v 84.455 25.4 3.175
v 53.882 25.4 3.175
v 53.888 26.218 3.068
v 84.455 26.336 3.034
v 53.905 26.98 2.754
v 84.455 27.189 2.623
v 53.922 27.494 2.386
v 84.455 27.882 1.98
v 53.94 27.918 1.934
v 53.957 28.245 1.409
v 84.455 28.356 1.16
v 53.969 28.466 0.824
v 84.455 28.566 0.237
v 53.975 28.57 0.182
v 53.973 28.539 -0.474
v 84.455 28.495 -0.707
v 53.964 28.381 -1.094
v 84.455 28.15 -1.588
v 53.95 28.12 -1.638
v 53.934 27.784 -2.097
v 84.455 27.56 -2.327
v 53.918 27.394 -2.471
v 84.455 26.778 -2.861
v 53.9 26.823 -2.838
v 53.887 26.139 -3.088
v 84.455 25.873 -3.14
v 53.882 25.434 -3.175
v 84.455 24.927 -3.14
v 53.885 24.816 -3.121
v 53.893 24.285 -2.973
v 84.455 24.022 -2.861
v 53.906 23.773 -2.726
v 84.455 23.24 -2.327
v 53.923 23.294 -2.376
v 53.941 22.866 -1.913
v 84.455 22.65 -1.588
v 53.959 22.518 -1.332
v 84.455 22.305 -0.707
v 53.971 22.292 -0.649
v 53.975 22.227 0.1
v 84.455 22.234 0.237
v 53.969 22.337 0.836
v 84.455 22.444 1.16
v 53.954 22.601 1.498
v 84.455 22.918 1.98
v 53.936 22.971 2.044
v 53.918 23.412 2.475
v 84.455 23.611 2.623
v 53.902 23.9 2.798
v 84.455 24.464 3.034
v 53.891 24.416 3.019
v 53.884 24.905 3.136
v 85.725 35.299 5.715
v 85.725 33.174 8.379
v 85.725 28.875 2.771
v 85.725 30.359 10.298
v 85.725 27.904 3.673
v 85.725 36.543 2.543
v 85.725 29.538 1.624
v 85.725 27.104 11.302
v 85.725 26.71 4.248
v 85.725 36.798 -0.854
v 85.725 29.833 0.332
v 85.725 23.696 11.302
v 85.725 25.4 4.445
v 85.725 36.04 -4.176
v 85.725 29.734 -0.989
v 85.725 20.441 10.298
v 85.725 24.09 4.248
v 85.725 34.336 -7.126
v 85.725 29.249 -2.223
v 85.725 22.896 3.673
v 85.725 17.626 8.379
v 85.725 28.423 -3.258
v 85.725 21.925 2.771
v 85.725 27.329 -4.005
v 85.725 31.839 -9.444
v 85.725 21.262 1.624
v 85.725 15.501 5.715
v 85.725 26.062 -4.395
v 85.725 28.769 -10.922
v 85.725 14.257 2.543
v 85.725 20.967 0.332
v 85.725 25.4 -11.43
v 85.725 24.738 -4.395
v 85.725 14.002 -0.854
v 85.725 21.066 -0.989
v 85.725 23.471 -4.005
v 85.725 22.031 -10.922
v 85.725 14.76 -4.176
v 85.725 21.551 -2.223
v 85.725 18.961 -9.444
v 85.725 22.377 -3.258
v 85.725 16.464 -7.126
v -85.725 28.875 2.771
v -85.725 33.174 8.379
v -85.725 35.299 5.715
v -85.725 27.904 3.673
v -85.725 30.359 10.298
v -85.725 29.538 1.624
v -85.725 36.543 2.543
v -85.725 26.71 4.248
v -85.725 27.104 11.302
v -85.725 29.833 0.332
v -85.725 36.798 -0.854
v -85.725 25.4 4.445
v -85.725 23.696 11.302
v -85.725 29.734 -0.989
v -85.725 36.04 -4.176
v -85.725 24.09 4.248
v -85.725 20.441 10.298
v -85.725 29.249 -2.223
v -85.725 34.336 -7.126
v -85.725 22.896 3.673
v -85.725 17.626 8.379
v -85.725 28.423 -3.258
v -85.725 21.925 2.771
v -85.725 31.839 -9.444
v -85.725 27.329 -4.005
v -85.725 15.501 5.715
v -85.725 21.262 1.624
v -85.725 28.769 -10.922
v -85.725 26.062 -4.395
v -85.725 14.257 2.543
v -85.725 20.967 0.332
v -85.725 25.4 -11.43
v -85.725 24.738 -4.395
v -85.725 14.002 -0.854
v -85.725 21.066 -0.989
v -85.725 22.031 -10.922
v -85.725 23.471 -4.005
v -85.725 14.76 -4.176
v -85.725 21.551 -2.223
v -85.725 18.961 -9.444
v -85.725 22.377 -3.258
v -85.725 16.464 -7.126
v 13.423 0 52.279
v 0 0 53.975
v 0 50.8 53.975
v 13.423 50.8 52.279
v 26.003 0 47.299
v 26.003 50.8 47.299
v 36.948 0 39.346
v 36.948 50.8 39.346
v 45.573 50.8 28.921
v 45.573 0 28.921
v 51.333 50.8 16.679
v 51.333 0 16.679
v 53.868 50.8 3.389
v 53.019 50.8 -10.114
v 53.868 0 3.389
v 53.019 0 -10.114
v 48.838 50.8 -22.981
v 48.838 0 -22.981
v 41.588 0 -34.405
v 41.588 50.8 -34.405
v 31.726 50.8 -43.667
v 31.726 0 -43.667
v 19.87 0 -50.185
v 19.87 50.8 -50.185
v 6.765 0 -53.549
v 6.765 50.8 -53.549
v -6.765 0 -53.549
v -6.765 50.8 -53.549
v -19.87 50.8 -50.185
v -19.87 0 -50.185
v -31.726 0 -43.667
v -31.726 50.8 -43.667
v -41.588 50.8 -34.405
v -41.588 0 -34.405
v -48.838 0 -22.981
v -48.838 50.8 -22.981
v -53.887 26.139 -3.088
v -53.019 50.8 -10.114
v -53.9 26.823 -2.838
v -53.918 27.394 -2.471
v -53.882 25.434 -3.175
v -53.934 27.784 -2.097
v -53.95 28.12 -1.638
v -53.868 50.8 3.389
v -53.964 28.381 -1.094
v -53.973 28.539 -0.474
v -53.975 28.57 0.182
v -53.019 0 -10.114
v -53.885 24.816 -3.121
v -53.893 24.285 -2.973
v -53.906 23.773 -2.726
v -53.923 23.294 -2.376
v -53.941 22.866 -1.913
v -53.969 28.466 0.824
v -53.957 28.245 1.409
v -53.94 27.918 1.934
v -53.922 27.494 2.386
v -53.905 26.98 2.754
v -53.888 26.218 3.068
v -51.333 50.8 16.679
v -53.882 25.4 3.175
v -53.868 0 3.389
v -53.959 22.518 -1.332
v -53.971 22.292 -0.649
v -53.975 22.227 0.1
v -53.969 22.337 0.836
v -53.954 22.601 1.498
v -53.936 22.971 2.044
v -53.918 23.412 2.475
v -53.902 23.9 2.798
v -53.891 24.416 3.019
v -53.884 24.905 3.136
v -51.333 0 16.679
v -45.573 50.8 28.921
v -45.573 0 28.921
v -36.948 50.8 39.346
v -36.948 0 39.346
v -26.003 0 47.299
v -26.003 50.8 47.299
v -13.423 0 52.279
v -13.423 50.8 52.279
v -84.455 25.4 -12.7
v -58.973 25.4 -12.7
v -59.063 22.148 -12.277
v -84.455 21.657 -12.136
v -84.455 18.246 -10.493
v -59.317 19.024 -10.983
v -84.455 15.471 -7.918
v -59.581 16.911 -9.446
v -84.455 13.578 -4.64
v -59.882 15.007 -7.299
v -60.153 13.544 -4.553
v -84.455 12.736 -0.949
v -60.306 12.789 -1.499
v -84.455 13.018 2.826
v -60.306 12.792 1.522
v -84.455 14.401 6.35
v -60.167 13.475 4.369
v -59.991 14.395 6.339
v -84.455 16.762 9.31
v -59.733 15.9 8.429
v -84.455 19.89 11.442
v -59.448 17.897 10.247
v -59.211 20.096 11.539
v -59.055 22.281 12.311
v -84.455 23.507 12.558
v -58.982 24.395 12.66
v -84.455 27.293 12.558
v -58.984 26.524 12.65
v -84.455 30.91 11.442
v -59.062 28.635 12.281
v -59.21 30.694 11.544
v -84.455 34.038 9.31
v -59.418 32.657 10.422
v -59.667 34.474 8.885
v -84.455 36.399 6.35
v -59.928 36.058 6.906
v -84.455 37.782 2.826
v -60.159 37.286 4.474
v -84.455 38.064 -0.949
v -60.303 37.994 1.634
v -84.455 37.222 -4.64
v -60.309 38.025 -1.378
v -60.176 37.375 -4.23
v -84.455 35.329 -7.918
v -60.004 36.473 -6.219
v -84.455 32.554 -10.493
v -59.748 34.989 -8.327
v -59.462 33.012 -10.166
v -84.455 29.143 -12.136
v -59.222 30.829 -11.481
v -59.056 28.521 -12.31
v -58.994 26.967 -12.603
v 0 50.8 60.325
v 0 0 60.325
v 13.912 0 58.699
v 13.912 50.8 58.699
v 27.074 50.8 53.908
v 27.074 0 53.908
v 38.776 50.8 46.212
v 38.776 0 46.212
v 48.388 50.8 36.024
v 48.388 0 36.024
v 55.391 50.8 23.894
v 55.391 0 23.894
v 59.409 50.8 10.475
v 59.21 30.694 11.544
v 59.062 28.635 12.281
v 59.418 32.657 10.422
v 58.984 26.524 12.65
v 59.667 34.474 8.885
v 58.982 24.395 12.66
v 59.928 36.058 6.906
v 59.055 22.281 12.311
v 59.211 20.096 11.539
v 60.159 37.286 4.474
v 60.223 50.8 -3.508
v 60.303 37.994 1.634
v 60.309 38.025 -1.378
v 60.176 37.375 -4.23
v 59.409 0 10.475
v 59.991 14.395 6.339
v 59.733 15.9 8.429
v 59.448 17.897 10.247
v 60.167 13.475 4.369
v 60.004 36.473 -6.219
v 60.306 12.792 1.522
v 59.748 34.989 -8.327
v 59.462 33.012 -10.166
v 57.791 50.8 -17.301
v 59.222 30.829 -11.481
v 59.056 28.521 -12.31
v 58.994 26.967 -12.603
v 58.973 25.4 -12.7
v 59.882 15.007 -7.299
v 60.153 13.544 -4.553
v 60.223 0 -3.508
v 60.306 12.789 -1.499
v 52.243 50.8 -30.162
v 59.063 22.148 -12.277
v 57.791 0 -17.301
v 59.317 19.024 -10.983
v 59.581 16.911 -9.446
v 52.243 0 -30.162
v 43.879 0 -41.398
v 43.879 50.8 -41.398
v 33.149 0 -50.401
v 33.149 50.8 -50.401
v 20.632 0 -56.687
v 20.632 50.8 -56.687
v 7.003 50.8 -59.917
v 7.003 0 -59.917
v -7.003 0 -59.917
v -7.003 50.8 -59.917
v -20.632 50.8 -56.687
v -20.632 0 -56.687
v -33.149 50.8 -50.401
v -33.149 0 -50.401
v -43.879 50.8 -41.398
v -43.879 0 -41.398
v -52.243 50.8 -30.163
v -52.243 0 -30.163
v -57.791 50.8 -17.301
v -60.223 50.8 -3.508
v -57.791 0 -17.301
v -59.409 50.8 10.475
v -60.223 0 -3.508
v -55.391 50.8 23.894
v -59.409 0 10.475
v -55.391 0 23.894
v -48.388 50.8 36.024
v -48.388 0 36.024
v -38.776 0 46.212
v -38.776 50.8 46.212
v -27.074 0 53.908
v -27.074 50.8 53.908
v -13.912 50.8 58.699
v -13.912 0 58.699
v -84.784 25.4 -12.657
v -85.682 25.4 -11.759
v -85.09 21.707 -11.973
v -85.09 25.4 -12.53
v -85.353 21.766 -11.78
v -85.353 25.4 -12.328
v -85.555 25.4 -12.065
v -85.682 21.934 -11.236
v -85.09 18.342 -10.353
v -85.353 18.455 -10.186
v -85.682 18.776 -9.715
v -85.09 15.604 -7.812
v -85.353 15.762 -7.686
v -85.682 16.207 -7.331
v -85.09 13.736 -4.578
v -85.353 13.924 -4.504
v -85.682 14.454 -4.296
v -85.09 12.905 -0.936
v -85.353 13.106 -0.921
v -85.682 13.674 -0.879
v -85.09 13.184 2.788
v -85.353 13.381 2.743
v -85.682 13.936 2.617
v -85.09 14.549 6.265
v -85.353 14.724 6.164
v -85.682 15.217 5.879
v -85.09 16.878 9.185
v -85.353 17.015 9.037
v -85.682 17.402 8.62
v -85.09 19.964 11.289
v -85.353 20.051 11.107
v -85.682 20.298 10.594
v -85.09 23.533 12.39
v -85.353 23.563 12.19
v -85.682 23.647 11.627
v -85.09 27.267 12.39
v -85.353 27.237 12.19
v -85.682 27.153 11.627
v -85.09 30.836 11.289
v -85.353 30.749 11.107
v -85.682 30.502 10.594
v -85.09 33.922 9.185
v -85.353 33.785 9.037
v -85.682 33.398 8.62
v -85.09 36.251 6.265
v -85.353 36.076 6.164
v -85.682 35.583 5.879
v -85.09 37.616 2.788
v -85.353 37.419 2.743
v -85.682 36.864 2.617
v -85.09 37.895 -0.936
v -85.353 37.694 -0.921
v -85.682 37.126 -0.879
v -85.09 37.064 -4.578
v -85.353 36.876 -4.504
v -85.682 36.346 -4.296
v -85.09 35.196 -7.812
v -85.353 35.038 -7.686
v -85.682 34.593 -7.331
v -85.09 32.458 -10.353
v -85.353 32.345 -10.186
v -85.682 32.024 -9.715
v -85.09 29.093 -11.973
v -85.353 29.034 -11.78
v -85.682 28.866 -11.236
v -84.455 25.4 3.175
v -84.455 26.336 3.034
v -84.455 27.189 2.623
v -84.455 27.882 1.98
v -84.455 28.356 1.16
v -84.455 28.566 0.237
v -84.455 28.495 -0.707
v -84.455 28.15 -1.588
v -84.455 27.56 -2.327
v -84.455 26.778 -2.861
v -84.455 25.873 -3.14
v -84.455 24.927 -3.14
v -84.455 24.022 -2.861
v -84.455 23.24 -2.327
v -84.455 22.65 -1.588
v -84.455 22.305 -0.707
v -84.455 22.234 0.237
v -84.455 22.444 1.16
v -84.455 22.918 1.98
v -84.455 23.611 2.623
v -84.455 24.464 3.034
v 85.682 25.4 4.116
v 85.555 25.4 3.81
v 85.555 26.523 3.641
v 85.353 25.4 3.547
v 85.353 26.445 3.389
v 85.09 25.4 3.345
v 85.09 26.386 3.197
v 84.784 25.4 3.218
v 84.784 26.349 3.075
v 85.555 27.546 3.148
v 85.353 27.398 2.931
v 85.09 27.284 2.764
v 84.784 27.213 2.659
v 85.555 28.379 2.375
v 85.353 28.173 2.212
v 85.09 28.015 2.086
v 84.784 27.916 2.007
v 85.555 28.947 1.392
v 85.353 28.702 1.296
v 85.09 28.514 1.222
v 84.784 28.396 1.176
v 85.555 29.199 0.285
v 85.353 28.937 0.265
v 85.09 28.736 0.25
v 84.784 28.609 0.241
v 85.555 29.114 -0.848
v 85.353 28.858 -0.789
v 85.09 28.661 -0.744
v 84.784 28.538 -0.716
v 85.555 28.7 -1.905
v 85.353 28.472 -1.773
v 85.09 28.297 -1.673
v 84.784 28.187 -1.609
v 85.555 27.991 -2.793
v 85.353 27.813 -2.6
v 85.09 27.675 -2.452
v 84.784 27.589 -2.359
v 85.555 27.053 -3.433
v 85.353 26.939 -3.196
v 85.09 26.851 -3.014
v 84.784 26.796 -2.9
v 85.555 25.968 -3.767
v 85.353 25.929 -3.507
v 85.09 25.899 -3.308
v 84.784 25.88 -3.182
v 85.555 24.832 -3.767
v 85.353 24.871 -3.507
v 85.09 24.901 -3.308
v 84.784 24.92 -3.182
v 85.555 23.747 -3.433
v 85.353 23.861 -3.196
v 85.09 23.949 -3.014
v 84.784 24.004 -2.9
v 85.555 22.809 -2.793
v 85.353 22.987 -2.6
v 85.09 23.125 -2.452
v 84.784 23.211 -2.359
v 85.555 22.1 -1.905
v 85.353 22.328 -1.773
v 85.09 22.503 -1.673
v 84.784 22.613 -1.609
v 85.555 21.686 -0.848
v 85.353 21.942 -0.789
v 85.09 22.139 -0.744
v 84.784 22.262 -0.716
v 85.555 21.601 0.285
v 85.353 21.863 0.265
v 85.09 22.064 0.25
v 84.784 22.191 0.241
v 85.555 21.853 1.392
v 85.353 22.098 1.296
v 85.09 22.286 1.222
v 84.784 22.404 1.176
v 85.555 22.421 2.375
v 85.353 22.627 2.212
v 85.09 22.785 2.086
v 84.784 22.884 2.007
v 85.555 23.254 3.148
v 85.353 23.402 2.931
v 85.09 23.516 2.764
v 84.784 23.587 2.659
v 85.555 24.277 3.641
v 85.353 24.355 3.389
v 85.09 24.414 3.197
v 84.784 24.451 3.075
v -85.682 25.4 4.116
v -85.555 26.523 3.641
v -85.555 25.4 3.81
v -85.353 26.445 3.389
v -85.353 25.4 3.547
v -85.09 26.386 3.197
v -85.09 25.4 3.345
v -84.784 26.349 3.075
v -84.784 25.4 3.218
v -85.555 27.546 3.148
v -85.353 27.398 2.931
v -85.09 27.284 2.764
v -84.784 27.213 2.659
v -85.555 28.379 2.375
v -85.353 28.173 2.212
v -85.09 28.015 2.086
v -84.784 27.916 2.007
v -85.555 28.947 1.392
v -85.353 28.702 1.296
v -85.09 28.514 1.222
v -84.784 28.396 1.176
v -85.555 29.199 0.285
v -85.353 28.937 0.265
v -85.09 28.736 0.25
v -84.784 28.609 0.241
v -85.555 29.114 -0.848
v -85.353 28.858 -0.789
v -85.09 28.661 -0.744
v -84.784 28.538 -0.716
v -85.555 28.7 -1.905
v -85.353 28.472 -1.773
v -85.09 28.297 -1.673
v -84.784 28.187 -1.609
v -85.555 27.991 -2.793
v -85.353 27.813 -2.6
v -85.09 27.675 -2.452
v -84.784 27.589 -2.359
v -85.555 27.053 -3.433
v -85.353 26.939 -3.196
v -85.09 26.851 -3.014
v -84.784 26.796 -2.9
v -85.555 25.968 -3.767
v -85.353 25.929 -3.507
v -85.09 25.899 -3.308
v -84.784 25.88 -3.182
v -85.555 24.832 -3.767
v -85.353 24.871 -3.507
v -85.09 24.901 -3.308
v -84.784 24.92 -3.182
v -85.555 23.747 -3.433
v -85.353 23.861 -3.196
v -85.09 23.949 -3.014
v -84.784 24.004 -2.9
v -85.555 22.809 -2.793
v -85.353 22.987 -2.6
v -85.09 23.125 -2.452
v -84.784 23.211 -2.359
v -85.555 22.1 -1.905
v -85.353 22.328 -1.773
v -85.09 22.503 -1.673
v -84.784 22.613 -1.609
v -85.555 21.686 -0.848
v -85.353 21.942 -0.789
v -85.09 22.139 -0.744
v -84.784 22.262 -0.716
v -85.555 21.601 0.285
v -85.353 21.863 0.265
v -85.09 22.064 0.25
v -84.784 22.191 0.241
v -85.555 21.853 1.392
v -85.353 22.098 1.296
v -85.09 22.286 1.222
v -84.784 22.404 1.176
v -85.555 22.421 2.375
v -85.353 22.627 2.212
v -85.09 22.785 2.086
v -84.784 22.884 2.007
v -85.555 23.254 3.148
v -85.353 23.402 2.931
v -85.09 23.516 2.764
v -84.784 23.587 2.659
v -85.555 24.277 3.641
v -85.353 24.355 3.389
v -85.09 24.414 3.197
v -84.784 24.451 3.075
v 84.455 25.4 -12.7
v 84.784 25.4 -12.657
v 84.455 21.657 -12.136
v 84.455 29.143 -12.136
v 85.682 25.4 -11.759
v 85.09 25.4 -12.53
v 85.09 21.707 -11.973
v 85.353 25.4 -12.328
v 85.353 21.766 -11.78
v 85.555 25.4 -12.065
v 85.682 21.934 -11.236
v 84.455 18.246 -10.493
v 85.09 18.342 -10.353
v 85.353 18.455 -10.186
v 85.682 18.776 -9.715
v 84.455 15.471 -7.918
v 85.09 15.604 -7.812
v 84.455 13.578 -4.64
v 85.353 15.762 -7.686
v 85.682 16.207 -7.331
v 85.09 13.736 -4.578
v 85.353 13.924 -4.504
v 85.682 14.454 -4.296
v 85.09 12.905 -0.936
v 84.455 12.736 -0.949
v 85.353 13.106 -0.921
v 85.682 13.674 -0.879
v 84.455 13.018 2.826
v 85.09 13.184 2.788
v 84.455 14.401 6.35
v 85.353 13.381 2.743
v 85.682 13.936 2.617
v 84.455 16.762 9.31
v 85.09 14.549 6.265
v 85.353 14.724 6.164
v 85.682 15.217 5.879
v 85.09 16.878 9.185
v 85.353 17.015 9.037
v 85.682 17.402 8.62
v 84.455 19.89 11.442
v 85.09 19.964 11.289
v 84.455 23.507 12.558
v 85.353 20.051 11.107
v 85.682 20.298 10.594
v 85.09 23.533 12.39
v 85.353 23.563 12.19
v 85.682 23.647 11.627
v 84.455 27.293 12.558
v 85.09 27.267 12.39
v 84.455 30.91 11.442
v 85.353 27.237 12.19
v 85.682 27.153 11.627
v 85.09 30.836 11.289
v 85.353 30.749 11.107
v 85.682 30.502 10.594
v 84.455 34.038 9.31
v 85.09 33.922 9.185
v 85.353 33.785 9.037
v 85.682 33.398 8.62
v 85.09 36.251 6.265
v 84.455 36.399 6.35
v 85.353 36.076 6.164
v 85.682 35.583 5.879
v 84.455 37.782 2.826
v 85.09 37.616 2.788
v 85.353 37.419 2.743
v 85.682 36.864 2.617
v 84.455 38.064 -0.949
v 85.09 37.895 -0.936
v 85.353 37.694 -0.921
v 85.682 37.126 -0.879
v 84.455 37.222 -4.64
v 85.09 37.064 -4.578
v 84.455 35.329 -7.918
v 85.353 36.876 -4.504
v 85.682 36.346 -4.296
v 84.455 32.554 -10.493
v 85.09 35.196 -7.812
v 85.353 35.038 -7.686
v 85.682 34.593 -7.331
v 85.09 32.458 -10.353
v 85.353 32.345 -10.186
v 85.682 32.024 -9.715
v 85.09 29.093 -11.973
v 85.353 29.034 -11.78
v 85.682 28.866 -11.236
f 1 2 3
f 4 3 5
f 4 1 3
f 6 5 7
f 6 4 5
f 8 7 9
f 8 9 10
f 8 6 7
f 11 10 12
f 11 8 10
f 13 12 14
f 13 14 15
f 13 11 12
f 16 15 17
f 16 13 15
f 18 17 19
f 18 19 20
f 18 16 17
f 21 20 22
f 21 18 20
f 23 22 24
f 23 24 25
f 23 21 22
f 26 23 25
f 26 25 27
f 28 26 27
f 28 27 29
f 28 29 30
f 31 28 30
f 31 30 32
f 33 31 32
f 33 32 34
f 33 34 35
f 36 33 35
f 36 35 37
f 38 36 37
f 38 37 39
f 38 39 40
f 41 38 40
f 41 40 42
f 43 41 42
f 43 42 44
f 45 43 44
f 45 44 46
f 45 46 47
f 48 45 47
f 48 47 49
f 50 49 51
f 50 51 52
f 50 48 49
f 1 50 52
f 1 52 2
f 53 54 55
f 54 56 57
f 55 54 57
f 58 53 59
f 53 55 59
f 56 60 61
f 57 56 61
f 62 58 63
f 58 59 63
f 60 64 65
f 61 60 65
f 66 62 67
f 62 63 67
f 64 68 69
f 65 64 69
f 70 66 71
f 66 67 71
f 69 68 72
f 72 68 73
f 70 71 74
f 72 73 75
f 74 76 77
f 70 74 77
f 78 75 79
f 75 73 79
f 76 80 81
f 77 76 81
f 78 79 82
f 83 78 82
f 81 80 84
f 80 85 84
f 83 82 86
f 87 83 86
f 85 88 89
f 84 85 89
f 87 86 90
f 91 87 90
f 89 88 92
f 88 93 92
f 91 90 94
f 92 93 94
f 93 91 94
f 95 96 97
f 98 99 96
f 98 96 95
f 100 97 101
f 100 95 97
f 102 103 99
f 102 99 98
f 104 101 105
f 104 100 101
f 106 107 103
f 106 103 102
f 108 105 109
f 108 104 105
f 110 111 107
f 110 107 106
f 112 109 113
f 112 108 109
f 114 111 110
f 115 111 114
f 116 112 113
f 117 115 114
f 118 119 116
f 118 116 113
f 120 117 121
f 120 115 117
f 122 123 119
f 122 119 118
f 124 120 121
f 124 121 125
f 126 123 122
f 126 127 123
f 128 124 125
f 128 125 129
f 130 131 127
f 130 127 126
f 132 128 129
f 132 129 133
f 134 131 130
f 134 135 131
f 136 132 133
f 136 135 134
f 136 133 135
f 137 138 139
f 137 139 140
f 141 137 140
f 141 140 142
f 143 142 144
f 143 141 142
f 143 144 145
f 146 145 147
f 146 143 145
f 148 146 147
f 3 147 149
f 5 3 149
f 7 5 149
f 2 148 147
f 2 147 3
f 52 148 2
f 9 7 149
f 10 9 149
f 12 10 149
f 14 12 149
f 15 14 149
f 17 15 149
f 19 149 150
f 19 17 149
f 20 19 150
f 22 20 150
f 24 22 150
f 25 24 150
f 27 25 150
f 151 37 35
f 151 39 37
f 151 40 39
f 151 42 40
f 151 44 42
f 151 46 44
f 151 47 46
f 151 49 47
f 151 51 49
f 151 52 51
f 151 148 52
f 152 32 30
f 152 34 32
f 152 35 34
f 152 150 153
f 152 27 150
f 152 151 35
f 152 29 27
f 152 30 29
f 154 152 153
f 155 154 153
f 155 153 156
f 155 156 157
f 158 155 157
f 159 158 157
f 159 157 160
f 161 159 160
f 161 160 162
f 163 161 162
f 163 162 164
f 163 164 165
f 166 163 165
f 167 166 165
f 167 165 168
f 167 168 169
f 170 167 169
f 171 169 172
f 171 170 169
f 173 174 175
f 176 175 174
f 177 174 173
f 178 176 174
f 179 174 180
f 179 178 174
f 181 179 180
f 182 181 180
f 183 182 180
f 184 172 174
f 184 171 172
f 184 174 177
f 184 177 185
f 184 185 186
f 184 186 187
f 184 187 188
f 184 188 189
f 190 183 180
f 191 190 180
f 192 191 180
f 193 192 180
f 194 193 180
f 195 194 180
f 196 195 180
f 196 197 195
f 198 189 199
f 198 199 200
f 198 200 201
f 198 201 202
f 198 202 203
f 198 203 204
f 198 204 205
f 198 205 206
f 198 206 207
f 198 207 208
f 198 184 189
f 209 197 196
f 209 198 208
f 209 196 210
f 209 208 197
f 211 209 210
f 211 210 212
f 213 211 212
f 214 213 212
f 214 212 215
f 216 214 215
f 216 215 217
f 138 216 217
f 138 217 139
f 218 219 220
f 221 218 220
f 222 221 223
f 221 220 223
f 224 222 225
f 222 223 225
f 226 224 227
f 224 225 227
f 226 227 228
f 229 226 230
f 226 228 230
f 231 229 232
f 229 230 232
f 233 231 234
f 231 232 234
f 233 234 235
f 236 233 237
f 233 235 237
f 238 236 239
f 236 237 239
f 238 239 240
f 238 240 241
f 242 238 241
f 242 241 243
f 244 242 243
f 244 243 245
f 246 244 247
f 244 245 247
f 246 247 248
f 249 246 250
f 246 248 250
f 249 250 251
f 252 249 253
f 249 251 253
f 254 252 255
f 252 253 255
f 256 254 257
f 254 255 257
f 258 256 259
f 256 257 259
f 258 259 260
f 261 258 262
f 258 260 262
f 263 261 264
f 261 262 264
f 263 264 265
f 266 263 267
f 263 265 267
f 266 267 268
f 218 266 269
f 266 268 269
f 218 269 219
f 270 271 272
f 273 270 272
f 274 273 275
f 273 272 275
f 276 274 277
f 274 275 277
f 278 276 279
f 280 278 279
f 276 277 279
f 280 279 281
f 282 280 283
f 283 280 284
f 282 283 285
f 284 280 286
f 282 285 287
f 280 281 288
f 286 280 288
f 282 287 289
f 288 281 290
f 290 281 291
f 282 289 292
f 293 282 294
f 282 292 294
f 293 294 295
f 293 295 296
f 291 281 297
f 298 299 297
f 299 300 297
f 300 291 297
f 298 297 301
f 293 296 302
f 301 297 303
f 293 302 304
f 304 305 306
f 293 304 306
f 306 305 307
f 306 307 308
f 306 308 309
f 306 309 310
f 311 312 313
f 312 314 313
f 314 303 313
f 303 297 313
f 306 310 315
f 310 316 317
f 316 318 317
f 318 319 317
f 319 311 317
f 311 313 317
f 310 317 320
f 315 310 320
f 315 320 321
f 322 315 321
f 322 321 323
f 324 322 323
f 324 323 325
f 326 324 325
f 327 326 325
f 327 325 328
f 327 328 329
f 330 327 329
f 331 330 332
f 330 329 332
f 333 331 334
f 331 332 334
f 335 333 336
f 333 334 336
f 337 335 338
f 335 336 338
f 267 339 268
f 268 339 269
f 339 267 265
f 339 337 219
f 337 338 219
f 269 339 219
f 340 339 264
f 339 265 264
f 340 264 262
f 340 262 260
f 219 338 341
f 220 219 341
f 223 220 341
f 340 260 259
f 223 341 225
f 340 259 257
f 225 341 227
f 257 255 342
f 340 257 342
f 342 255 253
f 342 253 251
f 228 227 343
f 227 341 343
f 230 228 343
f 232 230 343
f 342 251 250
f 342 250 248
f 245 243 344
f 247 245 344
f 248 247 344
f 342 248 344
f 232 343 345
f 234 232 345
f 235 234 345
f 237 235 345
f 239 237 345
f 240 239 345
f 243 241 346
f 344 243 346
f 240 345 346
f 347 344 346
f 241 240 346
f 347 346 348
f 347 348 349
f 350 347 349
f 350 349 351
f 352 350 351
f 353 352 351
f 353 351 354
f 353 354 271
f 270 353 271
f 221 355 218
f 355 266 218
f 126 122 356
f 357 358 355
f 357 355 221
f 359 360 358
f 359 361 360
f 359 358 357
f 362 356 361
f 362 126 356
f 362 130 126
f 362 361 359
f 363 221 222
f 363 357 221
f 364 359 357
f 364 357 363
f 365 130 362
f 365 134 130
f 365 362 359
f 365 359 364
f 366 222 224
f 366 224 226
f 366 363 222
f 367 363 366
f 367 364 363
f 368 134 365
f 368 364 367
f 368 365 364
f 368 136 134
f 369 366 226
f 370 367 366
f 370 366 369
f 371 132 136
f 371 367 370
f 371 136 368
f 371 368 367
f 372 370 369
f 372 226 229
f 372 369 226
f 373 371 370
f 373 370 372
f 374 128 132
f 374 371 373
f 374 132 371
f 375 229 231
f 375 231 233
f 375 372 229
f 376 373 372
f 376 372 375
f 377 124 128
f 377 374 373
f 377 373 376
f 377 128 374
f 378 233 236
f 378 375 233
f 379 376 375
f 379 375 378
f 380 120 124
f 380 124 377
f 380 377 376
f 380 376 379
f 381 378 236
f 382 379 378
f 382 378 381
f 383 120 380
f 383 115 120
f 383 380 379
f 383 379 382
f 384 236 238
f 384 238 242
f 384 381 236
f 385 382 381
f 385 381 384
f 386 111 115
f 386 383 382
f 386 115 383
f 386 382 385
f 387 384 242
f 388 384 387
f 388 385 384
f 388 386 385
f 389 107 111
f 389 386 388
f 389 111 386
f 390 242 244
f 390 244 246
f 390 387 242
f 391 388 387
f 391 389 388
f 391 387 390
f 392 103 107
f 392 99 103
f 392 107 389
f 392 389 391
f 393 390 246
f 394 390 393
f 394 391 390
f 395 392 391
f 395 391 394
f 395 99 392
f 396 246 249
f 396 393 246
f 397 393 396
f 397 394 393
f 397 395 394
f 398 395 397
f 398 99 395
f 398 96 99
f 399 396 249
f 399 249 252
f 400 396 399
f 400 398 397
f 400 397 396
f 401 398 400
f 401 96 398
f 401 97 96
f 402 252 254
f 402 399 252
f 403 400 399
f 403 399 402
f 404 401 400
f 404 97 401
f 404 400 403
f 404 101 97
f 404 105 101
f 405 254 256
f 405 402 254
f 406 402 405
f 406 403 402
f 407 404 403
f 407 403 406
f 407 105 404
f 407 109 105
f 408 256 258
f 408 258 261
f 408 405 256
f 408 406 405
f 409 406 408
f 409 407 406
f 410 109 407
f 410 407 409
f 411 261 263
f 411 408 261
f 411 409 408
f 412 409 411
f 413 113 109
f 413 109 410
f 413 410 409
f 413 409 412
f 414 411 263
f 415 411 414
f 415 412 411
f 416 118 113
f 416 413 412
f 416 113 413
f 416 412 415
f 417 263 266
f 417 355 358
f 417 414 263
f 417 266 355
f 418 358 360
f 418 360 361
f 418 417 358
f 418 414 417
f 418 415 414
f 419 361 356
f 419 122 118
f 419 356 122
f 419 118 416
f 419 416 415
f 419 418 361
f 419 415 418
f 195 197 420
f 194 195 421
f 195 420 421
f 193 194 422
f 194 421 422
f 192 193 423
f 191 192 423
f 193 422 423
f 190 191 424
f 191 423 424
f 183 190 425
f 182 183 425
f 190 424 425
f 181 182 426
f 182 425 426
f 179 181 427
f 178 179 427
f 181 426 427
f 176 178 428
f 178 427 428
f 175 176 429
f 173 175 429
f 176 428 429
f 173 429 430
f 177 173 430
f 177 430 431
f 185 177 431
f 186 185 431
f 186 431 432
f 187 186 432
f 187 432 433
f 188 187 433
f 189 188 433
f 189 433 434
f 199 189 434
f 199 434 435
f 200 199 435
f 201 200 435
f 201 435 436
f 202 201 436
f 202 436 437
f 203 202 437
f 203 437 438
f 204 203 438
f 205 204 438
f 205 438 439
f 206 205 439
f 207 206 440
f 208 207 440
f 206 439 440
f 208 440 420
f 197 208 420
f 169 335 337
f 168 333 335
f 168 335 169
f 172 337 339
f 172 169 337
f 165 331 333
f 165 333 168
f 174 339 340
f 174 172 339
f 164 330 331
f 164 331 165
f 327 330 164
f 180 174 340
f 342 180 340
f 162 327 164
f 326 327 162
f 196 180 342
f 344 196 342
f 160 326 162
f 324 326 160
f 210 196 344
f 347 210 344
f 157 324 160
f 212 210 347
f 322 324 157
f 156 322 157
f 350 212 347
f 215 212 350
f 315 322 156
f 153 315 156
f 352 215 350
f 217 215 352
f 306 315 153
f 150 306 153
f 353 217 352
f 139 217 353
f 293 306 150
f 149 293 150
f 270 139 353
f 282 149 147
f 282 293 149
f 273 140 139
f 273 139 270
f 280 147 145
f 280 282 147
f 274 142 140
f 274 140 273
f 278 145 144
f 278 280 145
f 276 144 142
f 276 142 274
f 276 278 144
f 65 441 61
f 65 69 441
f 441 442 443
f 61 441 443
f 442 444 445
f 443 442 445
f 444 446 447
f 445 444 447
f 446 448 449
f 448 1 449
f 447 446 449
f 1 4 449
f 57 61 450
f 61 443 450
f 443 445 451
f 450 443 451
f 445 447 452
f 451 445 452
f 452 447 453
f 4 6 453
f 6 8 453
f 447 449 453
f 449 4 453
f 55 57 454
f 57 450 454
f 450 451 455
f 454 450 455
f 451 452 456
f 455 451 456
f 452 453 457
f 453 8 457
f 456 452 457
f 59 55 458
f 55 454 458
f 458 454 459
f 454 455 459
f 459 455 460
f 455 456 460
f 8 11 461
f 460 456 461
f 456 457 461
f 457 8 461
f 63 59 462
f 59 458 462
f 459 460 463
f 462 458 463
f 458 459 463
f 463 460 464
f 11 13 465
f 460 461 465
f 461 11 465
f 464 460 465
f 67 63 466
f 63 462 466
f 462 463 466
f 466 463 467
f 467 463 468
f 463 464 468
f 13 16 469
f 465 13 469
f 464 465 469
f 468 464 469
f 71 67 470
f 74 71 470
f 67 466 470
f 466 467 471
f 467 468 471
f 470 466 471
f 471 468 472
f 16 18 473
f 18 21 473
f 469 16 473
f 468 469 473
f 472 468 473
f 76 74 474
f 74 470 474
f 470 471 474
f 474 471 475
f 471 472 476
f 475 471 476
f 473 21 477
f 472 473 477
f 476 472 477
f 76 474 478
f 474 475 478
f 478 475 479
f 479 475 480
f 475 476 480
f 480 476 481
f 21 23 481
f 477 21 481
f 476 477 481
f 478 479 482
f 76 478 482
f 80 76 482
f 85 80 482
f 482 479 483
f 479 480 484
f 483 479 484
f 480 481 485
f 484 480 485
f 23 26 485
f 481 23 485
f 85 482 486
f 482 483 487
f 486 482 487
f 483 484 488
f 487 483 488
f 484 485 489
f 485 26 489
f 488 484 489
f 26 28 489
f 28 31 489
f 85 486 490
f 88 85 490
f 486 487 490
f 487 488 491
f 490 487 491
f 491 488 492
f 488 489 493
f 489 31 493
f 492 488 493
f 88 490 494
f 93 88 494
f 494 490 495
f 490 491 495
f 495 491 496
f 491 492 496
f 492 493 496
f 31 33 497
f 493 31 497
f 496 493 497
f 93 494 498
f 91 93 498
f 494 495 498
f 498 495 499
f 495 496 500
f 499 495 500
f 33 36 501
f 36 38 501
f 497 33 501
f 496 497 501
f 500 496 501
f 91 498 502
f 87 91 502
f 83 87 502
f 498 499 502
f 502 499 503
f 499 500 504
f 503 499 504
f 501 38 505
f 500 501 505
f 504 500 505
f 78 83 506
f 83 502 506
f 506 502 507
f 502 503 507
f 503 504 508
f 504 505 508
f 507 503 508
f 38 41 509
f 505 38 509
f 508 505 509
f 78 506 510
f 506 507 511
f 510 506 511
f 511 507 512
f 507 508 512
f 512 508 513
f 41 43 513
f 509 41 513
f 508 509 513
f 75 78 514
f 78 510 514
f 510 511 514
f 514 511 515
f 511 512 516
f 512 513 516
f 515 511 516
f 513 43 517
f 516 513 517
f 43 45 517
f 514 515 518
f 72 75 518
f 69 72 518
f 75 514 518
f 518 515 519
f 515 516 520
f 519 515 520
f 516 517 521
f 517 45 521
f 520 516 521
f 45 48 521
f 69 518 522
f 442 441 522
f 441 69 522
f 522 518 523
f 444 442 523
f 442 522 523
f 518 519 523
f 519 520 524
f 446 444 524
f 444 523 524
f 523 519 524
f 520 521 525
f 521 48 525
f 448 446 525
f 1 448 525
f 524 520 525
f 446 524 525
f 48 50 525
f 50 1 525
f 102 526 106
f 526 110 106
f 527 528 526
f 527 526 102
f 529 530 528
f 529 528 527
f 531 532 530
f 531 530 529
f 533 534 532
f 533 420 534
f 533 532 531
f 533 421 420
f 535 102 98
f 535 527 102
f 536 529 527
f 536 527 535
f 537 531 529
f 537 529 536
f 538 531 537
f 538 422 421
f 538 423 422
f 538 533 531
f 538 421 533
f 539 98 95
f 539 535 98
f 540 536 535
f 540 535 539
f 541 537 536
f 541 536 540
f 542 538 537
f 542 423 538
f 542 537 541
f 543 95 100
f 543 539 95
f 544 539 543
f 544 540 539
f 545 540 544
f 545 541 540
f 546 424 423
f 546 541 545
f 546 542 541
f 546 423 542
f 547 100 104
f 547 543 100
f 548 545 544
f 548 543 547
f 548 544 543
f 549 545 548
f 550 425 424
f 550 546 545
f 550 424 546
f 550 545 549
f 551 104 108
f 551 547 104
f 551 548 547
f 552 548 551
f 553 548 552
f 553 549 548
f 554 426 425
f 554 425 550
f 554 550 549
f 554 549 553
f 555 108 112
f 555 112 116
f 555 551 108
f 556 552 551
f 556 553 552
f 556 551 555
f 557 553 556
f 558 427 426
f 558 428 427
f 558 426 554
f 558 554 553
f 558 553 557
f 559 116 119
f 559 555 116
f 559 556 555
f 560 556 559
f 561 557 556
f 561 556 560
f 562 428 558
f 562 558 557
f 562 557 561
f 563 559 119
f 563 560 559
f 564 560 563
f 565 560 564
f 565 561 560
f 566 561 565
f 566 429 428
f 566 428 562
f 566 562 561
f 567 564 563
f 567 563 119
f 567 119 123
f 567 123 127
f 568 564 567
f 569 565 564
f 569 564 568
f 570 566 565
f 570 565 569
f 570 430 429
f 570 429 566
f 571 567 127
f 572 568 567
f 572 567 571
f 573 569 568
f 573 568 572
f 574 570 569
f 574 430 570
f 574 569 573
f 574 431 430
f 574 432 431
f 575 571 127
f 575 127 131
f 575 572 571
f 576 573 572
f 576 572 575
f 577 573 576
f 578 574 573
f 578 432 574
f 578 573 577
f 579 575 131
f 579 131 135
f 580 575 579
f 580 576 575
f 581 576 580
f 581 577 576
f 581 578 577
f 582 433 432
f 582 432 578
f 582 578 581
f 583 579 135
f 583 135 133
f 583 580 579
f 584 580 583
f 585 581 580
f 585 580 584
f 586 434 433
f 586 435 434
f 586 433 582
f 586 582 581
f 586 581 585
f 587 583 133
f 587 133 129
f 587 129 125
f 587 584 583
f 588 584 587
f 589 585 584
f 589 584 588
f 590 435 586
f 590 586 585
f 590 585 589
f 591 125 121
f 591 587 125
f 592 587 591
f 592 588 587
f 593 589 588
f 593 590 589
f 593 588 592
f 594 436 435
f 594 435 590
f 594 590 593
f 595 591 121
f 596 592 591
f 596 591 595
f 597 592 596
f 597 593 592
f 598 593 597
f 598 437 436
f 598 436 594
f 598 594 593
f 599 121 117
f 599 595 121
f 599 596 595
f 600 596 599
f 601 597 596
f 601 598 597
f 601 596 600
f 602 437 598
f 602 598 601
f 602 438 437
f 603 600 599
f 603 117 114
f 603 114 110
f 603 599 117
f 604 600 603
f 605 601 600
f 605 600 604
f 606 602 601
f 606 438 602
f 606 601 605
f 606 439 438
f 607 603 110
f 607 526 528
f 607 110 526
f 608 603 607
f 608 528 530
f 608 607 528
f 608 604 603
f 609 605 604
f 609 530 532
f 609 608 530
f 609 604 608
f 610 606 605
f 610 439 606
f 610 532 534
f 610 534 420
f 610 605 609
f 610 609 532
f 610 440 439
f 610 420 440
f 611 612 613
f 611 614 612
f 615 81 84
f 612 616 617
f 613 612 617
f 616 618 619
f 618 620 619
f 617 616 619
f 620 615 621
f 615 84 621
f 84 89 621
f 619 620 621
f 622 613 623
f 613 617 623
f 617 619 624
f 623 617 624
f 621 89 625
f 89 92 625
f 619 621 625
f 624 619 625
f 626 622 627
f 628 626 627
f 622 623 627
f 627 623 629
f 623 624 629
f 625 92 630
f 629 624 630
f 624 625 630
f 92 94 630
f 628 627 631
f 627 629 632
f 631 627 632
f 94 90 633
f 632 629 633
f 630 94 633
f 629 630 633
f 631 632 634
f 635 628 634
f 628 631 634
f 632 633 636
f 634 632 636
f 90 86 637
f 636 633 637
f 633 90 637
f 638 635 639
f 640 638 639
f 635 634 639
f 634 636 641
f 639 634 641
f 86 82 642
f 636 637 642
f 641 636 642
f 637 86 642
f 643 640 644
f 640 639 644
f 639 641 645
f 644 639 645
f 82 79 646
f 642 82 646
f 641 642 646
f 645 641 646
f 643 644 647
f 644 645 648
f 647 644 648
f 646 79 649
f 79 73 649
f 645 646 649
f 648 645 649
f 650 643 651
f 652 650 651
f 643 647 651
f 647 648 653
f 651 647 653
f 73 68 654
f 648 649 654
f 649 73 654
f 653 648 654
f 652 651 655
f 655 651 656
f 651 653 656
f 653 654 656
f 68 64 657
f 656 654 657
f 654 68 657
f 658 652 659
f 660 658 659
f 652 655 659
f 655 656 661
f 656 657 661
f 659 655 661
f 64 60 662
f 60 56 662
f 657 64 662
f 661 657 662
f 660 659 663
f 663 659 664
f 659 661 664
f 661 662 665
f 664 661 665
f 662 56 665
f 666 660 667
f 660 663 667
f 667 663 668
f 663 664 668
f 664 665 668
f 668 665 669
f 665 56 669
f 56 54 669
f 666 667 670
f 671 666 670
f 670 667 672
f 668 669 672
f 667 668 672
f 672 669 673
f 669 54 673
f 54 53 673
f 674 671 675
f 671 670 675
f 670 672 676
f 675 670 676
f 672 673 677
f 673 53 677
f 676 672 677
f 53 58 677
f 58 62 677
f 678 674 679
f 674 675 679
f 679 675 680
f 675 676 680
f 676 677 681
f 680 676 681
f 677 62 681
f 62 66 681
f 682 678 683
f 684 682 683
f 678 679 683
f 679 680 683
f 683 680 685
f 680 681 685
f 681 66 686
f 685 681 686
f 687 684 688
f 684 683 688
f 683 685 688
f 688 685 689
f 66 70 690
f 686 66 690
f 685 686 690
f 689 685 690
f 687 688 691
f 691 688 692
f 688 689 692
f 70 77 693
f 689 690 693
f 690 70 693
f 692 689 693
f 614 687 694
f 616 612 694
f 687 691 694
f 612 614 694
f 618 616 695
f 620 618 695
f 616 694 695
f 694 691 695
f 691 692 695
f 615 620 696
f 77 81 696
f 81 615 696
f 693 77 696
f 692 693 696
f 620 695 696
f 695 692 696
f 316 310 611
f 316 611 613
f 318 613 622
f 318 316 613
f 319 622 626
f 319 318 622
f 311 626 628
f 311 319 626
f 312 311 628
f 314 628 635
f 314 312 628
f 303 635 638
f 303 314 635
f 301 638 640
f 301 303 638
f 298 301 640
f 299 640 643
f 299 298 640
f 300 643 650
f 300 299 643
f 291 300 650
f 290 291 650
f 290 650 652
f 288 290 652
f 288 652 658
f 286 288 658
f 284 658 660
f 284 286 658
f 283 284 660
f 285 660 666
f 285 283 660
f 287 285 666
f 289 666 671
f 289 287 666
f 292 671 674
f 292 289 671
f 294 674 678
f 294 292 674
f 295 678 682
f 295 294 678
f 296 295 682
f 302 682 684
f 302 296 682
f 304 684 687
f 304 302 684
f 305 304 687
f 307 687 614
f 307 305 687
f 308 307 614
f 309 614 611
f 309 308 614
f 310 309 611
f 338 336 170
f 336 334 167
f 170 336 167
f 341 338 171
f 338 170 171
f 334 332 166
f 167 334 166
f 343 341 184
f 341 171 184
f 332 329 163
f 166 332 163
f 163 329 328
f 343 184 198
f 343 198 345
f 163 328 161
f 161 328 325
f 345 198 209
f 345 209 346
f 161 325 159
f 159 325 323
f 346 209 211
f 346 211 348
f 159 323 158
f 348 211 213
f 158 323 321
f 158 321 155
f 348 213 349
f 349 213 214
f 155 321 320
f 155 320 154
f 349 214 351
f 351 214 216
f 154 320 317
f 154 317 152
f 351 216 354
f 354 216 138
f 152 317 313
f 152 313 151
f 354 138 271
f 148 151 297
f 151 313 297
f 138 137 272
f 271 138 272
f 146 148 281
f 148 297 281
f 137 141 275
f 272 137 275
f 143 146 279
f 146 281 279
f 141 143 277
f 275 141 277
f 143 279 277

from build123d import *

# Parameters (mm, degrees)
SKETCH1_R           = 60.325
SKETCH1_R_2         = 53.975
BOSS_EXTRUDE1_DEPTH = 50.8
BOSS_EXTRUDE2_START = -1.351993
SKETCH2_R           = 12.7
BOSS_EXTRUDE2_DEPTH = 26.751993
SKETCH3_R           = 3.175
CUT_EXTRUDE1_DEPTH  = 50.8
FILLET1_R           = 1.27


with BuildPart() as part:
    # Sketch1 → Boss-Extrude1 (new body)
    with BuildSketch(Plane(origin=(0, 0, 0), x_dir=(1, 0, 0), z_dir=(0, 1, 0))):
        with Locations(Location((0, 0, 0), (0, 0, 270))):
            Circle(SKETCH1_R)
        with Locations(Location((0, 0, 0), (0, 0, 270))):
            Circle(SKETCH1_R_2, mode=Mode.SUBTRACT)
    extrude(amount=BOSS_EXTRUDE1_DEPTH)

    # Sketch2 → Boss-Extrude2 (add)
    with BuildSketch(Plane.ZY.offset(60.325).offset(BOSS_EXTRUDE2_START)):
        with Locations(Location((0, 25.4, 0), (0, 0, 180))):
            Circle(SKETCH2_R)
    boss_extrude2 = extrude(amount=BOSS_EXTRUDE2_DEPTH)

    # Sketch3 → Cut-Extrude1 (cut)
    with BuildSketch(Plane.ZY.offset(85.725)):
        with Locations((0, 25.4)):
            Circle(SKETCH3_R)
    cut_extrude1 = extrude(amount=-CUT_EXTRUDE1_DEPTH, mode=Mode.SUBTRACT)

    # Mirror1: Boss-Extrude2, Cut-Extrude1 across plane
    add(boss_extrude2.mirror(Plane(origin=(0, 0, 0), x_dir=(0, 0, 1), z_dir=(1, 0, 0))))
    add(cut_extrude1.mirror(Plane(origin=(0, 0, 0), x_dir=(0, 0, 1), z_dir=(1, 0, 0))), mode=Mode.SUBTRACT)

    # Fillet1
    fillet1_edges = [part.edges().sort_by_distance(p)[0] for p in [
        (-85.725, 25.4, 12.7),
        (-85.725, 25.4, -3.175),
        (85.725, 25.4, 12.7),
        (85.725, 25.4, -3.175),
    ]]
    fillet(fillet1_edges, radius=FILLET1_R)


solid = part.part
